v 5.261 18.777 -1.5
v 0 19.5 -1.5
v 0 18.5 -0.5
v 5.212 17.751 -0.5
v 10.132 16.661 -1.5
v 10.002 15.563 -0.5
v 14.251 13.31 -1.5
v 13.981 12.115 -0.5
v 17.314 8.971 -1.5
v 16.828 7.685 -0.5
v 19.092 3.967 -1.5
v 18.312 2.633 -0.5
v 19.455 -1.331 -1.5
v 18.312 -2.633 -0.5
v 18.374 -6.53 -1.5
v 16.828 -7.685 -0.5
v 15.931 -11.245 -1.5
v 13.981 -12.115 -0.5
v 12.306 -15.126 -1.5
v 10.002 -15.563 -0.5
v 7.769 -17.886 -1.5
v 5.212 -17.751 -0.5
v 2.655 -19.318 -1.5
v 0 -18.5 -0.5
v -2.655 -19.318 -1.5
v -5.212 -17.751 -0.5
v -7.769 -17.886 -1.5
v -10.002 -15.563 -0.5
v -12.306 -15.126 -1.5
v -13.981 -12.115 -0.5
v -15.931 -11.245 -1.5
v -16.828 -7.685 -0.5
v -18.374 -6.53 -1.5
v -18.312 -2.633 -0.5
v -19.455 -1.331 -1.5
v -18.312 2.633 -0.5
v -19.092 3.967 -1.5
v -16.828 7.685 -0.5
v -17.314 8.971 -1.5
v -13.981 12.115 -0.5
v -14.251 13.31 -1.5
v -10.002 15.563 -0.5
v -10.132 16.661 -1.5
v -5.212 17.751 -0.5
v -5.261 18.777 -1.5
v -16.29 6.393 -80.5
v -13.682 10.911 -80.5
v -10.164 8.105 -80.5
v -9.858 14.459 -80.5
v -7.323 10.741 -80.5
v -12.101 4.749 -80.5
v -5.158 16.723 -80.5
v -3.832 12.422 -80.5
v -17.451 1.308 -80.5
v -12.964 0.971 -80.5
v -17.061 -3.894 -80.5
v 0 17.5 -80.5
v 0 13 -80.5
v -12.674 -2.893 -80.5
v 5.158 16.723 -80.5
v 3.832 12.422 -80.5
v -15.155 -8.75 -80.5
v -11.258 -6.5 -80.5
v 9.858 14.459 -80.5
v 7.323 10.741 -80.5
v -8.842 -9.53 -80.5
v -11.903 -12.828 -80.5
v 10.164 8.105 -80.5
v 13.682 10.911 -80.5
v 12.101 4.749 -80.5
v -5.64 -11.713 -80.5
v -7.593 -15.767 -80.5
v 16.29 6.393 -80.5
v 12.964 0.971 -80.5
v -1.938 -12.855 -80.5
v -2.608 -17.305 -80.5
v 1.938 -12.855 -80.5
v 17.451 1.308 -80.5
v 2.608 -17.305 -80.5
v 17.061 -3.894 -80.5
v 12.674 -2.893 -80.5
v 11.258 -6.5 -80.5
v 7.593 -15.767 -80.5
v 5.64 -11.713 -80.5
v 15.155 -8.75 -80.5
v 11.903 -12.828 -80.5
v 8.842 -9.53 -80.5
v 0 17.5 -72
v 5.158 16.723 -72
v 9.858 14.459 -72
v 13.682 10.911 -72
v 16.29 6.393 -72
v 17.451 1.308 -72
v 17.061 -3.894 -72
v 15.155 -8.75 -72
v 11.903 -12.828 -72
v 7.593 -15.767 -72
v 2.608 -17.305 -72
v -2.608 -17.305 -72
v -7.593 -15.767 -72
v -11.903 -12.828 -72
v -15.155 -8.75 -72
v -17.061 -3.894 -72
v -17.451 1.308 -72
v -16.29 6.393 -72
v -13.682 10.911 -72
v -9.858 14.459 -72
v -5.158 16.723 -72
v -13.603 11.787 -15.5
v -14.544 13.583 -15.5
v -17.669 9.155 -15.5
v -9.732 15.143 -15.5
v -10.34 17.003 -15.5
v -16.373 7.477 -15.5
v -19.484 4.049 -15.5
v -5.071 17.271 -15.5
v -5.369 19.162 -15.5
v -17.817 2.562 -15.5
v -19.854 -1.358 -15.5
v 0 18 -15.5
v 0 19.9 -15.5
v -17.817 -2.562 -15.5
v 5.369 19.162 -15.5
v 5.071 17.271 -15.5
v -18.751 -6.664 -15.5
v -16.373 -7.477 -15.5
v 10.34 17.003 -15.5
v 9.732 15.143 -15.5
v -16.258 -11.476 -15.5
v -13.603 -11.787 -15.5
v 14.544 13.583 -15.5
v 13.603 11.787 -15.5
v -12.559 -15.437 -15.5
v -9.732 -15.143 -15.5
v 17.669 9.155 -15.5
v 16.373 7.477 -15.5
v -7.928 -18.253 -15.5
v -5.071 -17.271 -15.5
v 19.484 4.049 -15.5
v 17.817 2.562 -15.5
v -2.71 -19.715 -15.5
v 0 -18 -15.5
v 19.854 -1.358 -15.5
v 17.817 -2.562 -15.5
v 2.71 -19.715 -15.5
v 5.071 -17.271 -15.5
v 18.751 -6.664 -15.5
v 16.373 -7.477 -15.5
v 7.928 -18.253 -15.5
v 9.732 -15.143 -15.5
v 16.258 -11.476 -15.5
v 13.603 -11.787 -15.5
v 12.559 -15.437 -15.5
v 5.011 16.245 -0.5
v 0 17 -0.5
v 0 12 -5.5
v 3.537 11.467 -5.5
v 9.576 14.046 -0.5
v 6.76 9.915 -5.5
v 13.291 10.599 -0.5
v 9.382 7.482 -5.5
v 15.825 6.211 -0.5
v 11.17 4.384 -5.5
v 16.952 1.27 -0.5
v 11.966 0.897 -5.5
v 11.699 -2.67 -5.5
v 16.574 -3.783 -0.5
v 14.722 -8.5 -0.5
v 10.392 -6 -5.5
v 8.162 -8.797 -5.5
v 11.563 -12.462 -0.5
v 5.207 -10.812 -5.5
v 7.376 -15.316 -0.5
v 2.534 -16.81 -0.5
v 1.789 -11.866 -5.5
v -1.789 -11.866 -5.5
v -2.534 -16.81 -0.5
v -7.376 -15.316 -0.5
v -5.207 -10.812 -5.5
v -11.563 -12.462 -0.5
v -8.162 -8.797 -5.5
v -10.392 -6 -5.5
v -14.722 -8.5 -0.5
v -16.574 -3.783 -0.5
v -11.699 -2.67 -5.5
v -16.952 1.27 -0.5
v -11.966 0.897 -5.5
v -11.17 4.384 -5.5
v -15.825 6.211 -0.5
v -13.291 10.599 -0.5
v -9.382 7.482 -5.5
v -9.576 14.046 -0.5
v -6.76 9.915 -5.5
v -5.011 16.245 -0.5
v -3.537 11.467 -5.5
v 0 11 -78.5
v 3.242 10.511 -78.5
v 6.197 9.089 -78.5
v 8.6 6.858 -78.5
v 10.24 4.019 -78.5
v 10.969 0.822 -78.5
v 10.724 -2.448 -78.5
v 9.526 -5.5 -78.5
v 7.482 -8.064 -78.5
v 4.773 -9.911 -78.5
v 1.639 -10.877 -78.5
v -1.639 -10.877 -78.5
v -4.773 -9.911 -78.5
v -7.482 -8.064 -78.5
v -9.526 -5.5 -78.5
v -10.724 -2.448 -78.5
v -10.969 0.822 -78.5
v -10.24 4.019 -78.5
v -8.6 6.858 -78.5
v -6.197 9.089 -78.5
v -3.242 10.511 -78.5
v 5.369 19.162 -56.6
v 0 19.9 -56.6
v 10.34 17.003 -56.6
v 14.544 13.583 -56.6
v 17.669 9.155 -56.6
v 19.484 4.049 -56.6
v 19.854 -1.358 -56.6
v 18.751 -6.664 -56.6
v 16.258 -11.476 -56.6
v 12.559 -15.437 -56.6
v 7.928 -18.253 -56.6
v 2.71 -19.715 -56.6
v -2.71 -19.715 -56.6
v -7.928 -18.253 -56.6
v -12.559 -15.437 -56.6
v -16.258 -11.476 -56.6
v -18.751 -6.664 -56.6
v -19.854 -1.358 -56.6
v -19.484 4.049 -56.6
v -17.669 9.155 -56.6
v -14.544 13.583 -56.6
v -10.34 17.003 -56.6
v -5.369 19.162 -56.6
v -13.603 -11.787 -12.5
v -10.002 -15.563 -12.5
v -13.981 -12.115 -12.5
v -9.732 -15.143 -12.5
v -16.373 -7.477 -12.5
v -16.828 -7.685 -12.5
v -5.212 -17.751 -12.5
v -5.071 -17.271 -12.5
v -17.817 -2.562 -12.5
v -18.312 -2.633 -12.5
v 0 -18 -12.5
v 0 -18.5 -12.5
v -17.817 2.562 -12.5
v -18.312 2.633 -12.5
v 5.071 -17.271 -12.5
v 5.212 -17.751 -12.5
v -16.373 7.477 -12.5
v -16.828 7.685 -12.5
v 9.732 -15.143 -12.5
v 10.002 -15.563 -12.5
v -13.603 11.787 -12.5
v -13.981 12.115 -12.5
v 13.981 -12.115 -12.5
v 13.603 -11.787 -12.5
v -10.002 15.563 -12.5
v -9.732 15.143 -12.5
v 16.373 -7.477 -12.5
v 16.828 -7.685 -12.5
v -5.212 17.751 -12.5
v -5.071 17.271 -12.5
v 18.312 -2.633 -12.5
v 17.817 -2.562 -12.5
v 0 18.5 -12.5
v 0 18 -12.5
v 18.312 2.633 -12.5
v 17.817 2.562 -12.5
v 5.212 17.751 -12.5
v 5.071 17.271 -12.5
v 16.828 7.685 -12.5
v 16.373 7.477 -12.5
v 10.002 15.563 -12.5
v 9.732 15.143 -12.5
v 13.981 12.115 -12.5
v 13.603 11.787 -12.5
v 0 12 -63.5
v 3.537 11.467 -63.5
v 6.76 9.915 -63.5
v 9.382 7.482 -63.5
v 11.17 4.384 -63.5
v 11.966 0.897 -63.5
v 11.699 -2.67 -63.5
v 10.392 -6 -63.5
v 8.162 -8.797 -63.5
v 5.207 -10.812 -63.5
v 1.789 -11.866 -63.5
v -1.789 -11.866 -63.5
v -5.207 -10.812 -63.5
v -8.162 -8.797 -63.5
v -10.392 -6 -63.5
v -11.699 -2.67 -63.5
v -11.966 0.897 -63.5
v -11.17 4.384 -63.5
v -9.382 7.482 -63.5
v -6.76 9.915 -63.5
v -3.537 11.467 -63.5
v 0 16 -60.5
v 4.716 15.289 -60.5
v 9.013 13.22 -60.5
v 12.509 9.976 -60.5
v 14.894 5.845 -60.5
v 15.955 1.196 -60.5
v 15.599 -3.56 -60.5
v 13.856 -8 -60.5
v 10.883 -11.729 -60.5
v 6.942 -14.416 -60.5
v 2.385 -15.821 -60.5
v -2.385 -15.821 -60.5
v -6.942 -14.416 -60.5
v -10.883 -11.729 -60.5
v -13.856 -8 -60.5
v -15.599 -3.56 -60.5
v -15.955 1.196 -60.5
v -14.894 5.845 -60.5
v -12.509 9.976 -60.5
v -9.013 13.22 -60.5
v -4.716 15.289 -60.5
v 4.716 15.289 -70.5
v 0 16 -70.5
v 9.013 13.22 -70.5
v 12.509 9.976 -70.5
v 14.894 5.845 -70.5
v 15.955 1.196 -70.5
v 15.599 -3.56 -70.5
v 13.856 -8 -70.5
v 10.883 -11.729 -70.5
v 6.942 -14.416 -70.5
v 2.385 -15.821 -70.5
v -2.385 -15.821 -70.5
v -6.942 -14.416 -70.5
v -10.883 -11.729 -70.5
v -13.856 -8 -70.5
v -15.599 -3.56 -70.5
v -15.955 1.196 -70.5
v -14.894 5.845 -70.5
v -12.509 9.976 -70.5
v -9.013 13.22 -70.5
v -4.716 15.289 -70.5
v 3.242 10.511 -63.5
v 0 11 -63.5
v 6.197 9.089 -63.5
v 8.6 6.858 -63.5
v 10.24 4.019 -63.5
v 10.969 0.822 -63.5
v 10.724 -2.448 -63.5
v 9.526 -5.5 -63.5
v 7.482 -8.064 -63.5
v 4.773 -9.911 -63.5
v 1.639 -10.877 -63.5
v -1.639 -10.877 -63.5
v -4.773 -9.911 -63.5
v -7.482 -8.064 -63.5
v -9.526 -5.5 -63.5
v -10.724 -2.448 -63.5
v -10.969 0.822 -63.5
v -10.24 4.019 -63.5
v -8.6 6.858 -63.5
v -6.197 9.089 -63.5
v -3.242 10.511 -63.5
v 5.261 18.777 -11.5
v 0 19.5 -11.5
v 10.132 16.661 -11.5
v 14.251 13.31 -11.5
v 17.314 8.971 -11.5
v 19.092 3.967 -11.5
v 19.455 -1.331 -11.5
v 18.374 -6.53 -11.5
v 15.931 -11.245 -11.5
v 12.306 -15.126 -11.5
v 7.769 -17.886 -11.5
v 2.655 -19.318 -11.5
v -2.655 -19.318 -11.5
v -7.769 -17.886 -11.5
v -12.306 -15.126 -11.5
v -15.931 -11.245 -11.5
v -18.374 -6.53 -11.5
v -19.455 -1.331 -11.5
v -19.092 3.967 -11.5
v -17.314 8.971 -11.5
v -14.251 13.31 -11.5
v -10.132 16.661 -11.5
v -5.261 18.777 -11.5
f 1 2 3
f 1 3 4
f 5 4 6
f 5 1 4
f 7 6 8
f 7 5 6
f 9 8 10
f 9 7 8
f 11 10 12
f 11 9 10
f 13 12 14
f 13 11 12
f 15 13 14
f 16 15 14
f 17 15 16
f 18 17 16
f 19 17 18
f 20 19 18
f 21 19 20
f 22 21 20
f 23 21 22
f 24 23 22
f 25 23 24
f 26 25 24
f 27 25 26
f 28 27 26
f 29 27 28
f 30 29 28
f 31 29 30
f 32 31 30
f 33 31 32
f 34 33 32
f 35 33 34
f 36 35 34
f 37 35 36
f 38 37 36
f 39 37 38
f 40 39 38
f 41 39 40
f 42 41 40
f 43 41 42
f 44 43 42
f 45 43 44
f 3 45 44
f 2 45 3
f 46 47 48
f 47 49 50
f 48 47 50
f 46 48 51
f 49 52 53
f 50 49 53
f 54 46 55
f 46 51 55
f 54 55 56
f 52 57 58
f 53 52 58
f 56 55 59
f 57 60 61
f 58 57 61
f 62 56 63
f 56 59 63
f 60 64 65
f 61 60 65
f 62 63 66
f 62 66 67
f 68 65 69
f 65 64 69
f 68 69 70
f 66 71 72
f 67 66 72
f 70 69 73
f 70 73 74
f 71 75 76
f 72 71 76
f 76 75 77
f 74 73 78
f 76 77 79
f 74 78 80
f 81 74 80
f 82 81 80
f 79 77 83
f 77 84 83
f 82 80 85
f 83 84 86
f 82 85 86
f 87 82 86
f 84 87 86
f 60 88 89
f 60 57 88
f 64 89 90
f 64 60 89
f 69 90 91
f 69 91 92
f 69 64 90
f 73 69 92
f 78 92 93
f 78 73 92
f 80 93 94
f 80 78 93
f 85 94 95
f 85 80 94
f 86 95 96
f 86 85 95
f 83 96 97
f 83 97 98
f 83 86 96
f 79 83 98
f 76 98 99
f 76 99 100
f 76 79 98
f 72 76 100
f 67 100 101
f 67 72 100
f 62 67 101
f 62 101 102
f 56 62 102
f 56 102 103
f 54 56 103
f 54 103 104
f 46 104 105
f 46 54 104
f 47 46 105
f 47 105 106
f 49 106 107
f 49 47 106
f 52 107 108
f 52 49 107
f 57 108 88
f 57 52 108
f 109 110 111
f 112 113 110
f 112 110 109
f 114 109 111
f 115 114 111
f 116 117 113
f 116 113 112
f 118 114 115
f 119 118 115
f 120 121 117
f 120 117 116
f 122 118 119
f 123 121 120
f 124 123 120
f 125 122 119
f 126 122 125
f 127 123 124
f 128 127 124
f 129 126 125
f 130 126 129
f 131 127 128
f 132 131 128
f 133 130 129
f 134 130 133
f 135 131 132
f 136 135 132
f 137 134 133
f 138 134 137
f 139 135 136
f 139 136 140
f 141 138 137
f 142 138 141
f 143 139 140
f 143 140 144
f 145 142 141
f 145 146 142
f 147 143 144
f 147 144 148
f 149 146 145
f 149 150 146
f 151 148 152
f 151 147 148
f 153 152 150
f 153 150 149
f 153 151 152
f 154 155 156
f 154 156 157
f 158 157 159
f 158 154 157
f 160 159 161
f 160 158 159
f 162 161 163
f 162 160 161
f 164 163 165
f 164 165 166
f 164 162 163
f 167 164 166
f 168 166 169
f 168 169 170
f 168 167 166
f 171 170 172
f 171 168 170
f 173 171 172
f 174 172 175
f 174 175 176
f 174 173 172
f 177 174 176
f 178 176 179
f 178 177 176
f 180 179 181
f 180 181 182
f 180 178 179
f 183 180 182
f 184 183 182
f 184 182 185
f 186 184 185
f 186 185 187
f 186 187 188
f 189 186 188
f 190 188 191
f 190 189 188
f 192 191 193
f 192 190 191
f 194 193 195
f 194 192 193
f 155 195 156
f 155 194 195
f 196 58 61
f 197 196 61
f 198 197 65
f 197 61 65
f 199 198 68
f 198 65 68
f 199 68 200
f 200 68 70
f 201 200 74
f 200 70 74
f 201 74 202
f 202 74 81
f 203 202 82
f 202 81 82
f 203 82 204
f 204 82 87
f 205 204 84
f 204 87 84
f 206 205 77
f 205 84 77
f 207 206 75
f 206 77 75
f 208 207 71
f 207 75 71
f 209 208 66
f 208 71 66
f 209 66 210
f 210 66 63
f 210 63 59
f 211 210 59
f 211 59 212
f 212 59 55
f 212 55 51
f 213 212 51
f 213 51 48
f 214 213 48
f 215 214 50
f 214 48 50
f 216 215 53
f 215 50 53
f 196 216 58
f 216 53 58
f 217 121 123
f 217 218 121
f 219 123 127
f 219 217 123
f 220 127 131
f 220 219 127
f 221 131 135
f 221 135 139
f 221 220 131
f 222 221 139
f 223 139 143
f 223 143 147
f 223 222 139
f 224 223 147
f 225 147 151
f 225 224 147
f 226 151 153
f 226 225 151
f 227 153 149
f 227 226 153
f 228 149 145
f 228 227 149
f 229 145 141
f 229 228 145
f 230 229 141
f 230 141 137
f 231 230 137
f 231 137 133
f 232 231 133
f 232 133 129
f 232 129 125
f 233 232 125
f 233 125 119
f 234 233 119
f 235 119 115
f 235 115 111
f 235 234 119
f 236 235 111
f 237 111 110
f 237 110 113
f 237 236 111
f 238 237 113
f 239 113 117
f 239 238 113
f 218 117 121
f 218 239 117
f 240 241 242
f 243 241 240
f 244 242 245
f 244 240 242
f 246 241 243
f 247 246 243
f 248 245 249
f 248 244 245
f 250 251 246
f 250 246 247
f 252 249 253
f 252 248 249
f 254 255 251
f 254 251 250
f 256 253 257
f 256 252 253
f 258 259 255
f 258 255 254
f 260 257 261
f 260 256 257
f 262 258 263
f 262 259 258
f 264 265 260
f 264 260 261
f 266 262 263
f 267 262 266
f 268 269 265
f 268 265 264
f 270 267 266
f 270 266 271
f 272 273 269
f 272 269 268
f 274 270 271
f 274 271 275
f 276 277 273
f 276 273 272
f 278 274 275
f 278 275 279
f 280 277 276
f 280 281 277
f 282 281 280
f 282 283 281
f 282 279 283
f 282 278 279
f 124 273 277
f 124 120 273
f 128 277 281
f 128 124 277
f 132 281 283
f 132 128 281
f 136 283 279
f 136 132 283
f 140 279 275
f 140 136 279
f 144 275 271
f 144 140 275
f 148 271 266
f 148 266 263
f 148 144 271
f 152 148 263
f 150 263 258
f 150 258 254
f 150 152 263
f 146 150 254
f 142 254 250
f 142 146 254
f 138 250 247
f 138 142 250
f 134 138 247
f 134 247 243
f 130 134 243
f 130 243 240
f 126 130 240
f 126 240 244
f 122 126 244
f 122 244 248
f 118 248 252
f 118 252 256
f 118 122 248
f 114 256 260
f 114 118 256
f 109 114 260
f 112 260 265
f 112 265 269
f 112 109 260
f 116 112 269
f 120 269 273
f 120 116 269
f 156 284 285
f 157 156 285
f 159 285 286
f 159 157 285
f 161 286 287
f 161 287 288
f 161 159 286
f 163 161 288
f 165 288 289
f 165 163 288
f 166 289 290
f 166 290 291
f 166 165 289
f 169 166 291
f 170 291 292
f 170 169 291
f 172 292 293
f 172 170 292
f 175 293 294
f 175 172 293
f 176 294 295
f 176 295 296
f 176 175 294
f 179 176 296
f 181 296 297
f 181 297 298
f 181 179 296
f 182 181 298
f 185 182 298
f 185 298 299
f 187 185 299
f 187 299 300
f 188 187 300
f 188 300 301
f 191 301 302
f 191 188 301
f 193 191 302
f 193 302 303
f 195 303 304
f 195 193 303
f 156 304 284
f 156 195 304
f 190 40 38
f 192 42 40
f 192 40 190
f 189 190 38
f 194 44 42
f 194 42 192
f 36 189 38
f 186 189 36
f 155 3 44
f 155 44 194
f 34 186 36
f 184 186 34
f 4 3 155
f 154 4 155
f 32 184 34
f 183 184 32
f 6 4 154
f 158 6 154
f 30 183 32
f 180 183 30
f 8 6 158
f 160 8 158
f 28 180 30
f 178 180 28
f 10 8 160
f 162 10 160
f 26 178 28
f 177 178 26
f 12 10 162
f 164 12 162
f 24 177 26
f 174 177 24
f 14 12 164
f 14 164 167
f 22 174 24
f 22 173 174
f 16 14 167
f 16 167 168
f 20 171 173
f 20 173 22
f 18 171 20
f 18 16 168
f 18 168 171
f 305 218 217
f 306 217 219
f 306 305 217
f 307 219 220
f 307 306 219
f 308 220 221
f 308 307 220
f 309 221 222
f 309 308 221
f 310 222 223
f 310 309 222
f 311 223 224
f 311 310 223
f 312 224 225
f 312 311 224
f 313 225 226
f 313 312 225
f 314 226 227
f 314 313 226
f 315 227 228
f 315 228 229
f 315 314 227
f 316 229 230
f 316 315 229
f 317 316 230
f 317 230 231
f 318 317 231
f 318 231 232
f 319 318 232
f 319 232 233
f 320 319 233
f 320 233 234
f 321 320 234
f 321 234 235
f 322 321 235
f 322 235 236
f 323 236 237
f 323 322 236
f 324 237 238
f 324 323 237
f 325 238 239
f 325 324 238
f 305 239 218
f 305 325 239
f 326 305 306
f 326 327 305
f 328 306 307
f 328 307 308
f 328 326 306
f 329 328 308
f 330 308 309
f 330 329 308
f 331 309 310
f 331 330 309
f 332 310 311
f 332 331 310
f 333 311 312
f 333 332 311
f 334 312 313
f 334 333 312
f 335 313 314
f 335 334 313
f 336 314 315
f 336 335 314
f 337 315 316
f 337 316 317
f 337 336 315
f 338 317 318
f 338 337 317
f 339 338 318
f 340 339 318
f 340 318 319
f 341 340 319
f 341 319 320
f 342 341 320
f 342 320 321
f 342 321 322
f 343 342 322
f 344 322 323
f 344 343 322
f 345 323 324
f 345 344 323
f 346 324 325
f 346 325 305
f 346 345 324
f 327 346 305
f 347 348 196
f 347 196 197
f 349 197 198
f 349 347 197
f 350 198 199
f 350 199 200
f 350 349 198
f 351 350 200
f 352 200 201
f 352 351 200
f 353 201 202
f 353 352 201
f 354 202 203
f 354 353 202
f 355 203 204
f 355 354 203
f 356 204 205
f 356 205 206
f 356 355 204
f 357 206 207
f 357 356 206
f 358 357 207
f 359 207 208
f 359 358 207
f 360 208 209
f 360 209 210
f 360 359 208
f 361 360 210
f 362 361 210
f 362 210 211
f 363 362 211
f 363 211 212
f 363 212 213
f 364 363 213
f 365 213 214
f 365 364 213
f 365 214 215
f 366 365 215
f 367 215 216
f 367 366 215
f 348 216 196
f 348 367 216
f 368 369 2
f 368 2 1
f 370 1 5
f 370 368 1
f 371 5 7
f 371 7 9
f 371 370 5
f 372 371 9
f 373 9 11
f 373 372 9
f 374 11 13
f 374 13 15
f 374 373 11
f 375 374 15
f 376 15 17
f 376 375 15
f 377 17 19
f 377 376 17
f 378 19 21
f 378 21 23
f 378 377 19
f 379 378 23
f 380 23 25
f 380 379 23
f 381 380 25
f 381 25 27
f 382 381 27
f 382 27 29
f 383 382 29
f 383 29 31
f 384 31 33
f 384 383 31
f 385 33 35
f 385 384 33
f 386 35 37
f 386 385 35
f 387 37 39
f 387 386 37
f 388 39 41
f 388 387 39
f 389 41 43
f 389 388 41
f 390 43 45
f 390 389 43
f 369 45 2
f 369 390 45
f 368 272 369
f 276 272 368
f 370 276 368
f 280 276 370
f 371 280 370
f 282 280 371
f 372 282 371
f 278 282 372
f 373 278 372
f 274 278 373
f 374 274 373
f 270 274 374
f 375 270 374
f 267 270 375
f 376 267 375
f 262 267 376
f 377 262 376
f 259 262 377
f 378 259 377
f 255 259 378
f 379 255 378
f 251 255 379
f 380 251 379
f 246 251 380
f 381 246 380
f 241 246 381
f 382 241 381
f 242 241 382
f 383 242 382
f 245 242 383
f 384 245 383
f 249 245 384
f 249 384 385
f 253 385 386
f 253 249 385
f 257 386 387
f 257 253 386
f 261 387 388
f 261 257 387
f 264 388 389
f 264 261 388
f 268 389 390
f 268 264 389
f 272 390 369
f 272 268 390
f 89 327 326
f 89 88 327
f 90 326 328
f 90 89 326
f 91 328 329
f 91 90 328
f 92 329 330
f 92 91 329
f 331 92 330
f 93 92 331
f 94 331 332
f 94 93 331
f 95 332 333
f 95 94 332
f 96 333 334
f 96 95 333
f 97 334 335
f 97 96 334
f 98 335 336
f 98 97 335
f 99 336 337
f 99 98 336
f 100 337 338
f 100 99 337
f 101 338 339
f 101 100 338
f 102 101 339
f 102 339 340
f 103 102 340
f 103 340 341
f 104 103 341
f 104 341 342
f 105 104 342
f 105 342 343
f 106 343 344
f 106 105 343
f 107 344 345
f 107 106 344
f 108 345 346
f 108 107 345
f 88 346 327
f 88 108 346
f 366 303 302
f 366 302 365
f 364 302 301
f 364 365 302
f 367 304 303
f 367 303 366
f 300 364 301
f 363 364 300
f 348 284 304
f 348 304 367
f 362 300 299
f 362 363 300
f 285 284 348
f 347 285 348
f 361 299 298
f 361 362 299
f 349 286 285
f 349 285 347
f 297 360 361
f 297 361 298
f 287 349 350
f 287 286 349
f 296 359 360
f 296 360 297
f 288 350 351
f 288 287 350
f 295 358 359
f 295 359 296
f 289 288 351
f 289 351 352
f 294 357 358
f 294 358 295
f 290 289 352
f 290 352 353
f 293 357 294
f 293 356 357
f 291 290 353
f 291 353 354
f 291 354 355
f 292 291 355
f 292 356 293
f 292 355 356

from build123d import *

# Parameters (mm, degrees)
CHANFRO1_SIZE = 1
CHANFRO3_SIZE = 2
CHANFRO4_SIZE = 5


with BuildPart() as part:
    # Esboço1 → Revolução1 (revolve)
    with BuildSketch(Plane(origin=(0, 0, 0), x_dir=(0, 0, -1), z_dir=(1, 0, 0))):
        Polygon((0.5, 12), (0.5, 19.5), (12.5, 19.5), (12.5, 18), (15.5, 18), (15.5, 19.9), (56.6, 19.9), (60.5, 16), (70.5, 16), (72, 17.5), (80.5, 17.5), (80.5, 12), (80.5, 11), (63.5, 11), (63.5, 12), align=None)
    revolve(axis=Axis((0, 0, 0), (0, 0, -1)))

    # Chanfro1
    chanfro1_edges = [part.edges().sort_by_distance(p)[0] for p in [
        (0, -19.5, -0.5),
        (0, -19.5, -12.5),
    ]]
    chamfer(chanfro1_edges, length=CHANFRO1_SIZE)

    # Chanfro3
    chanfro3_edges = [part.edges().sort_by_distance(p)[0] for p in [
        (0, -11, -80.5),
    ]]
    chamfer(chanfro3_edges, length=CHANFRO3_SIZE)

    # Chanfro4
    chanfro4_edges = [part.edges().sort_by_distance(p)[0] for p in [
        (0, -12, -0.5),
    ]]
    chamfer(chanfro4_edges, length=CHANFRO4_SIZE)


solid = part.part
